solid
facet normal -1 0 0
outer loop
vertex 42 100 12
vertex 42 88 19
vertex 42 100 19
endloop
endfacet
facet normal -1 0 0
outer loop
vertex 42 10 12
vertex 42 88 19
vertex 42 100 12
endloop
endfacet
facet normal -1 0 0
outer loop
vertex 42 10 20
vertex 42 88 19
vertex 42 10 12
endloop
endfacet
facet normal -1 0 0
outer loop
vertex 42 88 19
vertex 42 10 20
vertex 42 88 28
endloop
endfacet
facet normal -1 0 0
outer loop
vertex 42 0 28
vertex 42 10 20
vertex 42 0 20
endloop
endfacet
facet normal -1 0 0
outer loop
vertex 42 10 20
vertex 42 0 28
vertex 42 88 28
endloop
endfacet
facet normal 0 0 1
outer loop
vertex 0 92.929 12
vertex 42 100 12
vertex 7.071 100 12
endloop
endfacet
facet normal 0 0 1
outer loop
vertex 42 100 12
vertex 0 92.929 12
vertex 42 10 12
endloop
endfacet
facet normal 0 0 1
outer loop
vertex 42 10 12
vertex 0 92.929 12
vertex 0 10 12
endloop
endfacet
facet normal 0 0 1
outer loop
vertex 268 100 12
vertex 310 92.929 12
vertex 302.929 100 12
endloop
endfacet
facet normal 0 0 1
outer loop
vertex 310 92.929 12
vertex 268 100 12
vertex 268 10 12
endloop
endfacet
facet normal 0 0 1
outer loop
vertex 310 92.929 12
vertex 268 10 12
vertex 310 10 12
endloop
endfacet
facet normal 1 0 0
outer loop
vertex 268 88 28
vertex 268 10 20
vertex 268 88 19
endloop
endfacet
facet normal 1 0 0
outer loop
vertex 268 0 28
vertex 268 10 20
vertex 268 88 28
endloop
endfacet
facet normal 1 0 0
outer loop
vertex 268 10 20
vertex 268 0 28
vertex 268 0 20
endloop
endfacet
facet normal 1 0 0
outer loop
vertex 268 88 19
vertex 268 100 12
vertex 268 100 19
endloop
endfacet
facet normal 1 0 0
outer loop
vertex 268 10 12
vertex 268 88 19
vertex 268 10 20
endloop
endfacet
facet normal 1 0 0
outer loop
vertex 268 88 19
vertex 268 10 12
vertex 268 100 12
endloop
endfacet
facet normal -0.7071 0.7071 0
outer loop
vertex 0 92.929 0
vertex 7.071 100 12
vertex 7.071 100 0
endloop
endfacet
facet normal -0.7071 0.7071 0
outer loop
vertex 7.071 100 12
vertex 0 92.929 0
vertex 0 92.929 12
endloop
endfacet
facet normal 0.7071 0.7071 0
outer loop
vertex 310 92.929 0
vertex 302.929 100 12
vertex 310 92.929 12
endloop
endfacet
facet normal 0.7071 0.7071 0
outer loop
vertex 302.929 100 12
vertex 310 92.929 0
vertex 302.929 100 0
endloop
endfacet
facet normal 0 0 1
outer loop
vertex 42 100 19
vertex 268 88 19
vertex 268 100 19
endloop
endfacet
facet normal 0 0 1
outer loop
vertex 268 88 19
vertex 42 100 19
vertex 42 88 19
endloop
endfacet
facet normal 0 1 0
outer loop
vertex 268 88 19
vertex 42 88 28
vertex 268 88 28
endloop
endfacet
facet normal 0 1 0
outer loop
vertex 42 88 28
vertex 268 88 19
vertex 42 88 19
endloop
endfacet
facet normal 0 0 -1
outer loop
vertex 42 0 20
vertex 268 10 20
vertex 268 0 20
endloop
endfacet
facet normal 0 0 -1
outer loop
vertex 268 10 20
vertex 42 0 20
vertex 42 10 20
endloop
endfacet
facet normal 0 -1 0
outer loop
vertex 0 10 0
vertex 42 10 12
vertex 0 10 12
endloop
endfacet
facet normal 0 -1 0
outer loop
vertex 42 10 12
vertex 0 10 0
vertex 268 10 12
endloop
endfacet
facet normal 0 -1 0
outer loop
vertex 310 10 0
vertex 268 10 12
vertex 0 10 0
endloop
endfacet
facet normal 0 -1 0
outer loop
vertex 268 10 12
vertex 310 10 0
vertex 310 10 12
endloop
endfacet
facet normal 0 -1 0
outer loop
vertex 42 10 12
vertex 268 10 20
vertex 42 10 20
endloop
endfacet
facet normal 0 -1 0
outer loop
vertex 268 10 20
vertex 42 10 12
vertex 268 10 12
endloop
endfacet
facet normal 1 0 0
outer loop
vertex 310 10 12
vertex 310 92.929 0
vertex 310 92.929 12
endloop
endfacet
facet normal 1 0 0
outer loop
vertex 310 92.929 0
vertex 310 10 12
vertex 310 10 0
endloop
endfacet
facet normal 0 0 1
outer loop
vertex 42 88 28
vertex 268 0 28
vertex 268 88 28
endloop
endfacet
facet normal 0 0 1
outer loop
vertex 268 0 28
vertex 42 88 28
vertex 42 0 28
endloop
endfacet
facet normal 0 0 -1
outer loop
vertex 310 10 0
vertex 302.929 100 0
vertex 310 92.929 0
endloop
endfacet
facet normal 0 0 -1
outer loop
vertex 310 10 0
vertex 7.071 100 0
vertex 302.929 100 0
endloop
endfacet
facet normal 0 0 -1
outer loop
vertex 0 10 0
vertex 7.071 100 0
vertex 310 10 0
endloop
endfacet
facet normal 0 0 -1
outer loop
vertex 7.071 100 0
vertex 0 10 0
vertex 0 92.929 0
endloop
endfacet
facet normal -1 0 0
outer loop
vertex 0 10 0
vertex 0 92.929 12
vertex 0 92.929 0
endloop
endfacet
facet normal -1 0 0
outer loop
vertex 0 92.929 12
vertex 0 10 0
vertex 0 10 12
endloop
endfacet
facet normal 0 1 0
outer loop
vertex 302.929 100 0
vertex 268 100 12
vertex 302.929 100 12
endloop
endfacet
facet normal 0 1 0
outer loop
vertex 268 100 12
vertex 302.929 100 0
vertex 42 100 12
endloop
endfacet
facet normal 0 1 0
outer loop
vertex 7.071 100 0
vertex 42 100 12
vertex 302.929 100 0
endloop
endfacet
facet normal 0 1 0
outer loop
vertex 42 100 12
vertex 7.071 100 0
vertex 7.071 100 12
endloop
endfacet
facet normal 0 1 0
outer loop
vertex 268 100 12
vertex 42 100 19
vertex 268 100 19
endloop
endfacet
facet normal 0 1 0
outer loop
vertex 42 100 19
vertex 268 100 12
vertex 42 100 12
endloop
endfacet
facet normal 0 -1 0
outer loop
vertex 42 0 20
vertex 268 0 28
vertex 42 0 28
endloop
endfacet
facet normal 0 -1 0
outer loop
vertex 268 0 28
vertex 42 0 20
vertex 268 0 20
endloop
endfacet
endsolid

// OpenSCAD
include <../src/wardrobe.scad>;
plank_zy_side();
//github_openscad -o wardrobe_2/plank_zy_side.stl -D wardrobe_n=2 -D cutting_edge=0 -D break_view_length=0 wardrobe_2/plank_zy_side_stl.scad
